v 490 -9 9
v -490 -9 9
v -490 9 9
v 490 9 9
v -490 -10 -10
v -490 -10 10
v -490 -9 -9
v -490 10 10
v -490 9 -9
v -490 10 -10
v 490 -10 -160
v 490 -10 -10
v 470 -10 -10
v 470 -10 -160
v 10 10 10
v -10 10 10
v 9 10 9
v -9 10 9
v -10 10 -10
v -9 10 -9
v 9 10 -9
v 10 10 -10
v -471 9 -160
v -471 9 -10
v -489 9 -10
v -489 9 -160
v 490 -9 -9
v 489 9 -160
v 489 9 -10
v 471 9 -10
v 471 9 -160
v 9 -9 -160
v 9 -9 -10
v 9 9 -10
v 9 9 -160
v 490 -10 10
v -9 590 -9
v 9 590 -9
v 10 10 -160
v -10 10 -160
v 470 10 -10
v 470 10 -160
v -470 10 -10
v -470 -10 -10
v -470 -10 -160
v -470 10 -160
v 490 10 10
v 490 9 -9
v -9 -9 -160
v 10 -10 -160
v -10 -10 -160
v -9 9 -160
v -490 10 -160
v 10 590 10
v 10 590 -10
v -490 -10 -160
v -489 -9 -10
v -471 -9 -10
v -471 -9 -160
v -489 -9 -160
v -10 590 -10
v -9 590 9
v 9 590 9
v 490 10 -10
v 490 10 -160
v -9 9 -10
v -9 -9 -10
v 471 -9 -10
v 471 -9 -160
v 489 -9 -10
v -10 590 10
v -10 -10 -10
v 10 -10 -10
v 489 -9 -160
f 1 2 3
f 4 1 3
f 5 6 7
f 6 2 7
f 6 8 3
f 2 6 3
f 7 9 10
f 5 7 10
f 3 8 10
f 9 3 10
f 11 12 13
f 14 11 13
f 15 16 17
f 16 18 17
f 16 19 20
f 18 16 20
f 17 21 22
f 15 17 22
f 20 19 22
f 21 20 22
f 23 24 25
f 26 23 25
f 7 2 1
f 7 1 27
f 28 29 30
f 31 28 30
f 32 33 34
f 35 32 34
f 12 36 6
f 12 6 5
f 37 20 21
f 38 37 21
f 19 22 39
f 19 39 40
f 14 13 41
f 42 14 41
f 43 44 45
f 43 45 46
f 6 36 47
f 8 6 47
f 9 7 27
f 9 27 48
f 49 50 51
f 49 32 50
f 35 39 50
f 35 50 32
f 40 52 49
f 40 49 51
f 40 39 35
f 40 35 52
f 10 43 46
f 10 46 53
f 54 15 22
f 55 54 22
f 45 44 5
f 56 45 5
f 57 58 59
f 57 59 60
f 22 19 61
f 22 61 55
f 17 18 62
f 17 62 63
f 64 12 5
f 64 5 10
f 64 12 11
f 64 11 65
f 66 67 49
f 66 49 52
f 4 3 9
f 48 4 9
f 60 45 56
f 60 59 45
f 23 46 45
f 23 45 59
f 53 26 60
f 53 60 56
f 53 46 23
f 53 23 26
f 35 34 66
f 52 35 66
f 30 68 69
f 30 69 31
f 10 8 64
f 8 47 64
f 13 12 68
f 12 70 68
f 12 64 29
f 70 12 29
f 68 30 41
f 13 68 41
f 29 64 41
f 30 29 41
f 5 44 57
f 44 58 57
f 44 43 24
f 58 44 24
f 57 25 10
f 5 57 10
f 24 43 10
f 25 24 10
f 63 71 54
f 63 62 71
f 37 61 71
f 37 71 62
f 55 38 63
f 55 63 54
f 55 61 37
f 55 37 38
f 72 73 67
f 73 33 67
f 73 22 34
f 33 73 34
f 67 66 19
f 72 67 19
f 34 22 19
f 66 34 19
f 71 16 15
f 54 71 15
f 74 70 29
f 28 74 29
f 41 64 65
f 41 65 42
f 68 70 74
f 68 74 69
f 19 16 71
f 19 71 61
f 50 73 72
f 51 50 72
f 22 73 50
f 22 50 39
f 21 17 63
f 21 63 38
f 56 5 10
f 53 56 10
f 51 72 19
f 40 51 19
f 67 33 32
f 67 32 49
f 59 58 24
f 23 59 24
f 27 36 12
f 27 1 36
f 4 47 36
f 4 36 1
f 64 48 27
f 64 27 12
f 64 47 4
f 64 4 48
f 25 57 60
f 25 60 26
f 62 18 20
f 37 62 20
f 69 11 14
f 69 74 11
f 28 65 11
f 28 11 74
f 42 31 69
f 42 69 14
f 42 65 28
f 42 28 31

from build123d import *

# Parameters (mm, degrees)
CROQUIS1_W              = 20
CROQUIS1_H              = 20
CROQUIS1_W_2            = 18
CROQUIS1_H_2            = 18
EXTRUIR_L_MINA1_DEPTH   = 490
CROQUIS2_W              = 20
CROQUIS2_H              = 20
CROQUIS2_W_2            = 18
CROQUIS2_H_2            = 18
EXTRUIR_L_MINA3_DEPTH   = 150
CROQUIS3_W              = 20
CROQUIS3_H              = 20
CROQUIS3_W_2            = 18
CROQUIS3_H_2            = 18
EXTRUIR_L_MINA5_DEPTH   = 150
EXTRUIR_L_MINA5_2_DEPTH = 150
CROQUIS4_W              = 20
CROQUIS4_H              = 20
CROQUIS4_W_2            = 18
CROQUIS4_H_2            = 18
EXTRUIR_L_MINA6_DEPTH   = 580


with BuildPart() as part:
    # Croquis1 → Extruir-Lámina1 (new, symmetric)
    with BuildSketch(Plane(origin=(0, 0, 0), x_dir=(0, 0, -1), z_dir=(1, 0, 0))):
        Rectangle(CROQUIS1_W, CROQUIS1_H)
        Rectangle(CROQUIS1_W_2, CROQUIS1_H_2, mode=Mode.SUBTRACT)
    extrude(amount=EXTRUIR_L_MINA1_DEPTH, both=True)


with BuildPart() as body_2:
    # Croquis2 → Extruir-Lámina3 (new body)
    with BuildSketch(Plane(origin=(0, 0, -10), x_dir=(-1, 0, 0), z_dir=(0, 0, -1))):
        Rectangle(CROQUIS2_W, CROQUIS2_H)
        Rectangle(CROQUIS2_W_2, CROQUIS2_H_2, mode=Mode.SUBTRACT)
    extrude(amount=EXTRUIR_L_MINA3_DEPTH)


with BuildPart() as body_3:
    # Croquis3 → Extruir-Lámina5 (new body)
    with BuildSketch(Plane(origin=(0, 0, -10), x_dir=(-1, 0, 0), z_dir=(0, 0, -1))):
        with Locations((-480, 0)):
            Rectangle(CROQUIS3_W, CROQUIS3_H)
        with Locations((-480, 0)):
            Rectangle(CROQUIS3_W_2, CROQUIS3_H_2, mode=Mode.SUBTRACT)
    extrude(amount=EXTRUIR_L_MINA5_DEPTH)


with BuildPart() as body_4:
    # Croquis3 → Extruir-L_mina5 2 (new body)
    with BuildSketch(Plane(origin=(0, 0, -10), x_dir=(-1, 0, 0), z_dir=(0, 0, -1))):
        with Locations((480, 0)):
            Rectangle(CROQUIS3_W, CROQUIS3_H)
        with Locations((480, 0)):
            Rectangle(CROQUIS3_W_2, CROQUIS3_H_2, mode=Mode.SUBTRACT)
    extrude(amount=EXTRUIR_L_MINA5_2_DEPTH)


with BuildPart() as body_5:
    # Croquis4 → Extruir-Lámina6 (new body)
    with BuildSketch(Plane(origin=(0, 10, 0), x_dir=(1, 0, 0), z_dir=(0, 1, 0))):
        Rectangle(CROQUIS4_W, CROQUIS4_H)
        Rectangle(CROQUIS4_W_2, CROQUIS4_H_2, mode=Mode.SUBTRACT)
    extrude(amount=EXTRUIR_L_MINA6_DEPTH)


solid = Compound([part.part, body_2.part, body_3.part, body_4.part, body_5.part])
